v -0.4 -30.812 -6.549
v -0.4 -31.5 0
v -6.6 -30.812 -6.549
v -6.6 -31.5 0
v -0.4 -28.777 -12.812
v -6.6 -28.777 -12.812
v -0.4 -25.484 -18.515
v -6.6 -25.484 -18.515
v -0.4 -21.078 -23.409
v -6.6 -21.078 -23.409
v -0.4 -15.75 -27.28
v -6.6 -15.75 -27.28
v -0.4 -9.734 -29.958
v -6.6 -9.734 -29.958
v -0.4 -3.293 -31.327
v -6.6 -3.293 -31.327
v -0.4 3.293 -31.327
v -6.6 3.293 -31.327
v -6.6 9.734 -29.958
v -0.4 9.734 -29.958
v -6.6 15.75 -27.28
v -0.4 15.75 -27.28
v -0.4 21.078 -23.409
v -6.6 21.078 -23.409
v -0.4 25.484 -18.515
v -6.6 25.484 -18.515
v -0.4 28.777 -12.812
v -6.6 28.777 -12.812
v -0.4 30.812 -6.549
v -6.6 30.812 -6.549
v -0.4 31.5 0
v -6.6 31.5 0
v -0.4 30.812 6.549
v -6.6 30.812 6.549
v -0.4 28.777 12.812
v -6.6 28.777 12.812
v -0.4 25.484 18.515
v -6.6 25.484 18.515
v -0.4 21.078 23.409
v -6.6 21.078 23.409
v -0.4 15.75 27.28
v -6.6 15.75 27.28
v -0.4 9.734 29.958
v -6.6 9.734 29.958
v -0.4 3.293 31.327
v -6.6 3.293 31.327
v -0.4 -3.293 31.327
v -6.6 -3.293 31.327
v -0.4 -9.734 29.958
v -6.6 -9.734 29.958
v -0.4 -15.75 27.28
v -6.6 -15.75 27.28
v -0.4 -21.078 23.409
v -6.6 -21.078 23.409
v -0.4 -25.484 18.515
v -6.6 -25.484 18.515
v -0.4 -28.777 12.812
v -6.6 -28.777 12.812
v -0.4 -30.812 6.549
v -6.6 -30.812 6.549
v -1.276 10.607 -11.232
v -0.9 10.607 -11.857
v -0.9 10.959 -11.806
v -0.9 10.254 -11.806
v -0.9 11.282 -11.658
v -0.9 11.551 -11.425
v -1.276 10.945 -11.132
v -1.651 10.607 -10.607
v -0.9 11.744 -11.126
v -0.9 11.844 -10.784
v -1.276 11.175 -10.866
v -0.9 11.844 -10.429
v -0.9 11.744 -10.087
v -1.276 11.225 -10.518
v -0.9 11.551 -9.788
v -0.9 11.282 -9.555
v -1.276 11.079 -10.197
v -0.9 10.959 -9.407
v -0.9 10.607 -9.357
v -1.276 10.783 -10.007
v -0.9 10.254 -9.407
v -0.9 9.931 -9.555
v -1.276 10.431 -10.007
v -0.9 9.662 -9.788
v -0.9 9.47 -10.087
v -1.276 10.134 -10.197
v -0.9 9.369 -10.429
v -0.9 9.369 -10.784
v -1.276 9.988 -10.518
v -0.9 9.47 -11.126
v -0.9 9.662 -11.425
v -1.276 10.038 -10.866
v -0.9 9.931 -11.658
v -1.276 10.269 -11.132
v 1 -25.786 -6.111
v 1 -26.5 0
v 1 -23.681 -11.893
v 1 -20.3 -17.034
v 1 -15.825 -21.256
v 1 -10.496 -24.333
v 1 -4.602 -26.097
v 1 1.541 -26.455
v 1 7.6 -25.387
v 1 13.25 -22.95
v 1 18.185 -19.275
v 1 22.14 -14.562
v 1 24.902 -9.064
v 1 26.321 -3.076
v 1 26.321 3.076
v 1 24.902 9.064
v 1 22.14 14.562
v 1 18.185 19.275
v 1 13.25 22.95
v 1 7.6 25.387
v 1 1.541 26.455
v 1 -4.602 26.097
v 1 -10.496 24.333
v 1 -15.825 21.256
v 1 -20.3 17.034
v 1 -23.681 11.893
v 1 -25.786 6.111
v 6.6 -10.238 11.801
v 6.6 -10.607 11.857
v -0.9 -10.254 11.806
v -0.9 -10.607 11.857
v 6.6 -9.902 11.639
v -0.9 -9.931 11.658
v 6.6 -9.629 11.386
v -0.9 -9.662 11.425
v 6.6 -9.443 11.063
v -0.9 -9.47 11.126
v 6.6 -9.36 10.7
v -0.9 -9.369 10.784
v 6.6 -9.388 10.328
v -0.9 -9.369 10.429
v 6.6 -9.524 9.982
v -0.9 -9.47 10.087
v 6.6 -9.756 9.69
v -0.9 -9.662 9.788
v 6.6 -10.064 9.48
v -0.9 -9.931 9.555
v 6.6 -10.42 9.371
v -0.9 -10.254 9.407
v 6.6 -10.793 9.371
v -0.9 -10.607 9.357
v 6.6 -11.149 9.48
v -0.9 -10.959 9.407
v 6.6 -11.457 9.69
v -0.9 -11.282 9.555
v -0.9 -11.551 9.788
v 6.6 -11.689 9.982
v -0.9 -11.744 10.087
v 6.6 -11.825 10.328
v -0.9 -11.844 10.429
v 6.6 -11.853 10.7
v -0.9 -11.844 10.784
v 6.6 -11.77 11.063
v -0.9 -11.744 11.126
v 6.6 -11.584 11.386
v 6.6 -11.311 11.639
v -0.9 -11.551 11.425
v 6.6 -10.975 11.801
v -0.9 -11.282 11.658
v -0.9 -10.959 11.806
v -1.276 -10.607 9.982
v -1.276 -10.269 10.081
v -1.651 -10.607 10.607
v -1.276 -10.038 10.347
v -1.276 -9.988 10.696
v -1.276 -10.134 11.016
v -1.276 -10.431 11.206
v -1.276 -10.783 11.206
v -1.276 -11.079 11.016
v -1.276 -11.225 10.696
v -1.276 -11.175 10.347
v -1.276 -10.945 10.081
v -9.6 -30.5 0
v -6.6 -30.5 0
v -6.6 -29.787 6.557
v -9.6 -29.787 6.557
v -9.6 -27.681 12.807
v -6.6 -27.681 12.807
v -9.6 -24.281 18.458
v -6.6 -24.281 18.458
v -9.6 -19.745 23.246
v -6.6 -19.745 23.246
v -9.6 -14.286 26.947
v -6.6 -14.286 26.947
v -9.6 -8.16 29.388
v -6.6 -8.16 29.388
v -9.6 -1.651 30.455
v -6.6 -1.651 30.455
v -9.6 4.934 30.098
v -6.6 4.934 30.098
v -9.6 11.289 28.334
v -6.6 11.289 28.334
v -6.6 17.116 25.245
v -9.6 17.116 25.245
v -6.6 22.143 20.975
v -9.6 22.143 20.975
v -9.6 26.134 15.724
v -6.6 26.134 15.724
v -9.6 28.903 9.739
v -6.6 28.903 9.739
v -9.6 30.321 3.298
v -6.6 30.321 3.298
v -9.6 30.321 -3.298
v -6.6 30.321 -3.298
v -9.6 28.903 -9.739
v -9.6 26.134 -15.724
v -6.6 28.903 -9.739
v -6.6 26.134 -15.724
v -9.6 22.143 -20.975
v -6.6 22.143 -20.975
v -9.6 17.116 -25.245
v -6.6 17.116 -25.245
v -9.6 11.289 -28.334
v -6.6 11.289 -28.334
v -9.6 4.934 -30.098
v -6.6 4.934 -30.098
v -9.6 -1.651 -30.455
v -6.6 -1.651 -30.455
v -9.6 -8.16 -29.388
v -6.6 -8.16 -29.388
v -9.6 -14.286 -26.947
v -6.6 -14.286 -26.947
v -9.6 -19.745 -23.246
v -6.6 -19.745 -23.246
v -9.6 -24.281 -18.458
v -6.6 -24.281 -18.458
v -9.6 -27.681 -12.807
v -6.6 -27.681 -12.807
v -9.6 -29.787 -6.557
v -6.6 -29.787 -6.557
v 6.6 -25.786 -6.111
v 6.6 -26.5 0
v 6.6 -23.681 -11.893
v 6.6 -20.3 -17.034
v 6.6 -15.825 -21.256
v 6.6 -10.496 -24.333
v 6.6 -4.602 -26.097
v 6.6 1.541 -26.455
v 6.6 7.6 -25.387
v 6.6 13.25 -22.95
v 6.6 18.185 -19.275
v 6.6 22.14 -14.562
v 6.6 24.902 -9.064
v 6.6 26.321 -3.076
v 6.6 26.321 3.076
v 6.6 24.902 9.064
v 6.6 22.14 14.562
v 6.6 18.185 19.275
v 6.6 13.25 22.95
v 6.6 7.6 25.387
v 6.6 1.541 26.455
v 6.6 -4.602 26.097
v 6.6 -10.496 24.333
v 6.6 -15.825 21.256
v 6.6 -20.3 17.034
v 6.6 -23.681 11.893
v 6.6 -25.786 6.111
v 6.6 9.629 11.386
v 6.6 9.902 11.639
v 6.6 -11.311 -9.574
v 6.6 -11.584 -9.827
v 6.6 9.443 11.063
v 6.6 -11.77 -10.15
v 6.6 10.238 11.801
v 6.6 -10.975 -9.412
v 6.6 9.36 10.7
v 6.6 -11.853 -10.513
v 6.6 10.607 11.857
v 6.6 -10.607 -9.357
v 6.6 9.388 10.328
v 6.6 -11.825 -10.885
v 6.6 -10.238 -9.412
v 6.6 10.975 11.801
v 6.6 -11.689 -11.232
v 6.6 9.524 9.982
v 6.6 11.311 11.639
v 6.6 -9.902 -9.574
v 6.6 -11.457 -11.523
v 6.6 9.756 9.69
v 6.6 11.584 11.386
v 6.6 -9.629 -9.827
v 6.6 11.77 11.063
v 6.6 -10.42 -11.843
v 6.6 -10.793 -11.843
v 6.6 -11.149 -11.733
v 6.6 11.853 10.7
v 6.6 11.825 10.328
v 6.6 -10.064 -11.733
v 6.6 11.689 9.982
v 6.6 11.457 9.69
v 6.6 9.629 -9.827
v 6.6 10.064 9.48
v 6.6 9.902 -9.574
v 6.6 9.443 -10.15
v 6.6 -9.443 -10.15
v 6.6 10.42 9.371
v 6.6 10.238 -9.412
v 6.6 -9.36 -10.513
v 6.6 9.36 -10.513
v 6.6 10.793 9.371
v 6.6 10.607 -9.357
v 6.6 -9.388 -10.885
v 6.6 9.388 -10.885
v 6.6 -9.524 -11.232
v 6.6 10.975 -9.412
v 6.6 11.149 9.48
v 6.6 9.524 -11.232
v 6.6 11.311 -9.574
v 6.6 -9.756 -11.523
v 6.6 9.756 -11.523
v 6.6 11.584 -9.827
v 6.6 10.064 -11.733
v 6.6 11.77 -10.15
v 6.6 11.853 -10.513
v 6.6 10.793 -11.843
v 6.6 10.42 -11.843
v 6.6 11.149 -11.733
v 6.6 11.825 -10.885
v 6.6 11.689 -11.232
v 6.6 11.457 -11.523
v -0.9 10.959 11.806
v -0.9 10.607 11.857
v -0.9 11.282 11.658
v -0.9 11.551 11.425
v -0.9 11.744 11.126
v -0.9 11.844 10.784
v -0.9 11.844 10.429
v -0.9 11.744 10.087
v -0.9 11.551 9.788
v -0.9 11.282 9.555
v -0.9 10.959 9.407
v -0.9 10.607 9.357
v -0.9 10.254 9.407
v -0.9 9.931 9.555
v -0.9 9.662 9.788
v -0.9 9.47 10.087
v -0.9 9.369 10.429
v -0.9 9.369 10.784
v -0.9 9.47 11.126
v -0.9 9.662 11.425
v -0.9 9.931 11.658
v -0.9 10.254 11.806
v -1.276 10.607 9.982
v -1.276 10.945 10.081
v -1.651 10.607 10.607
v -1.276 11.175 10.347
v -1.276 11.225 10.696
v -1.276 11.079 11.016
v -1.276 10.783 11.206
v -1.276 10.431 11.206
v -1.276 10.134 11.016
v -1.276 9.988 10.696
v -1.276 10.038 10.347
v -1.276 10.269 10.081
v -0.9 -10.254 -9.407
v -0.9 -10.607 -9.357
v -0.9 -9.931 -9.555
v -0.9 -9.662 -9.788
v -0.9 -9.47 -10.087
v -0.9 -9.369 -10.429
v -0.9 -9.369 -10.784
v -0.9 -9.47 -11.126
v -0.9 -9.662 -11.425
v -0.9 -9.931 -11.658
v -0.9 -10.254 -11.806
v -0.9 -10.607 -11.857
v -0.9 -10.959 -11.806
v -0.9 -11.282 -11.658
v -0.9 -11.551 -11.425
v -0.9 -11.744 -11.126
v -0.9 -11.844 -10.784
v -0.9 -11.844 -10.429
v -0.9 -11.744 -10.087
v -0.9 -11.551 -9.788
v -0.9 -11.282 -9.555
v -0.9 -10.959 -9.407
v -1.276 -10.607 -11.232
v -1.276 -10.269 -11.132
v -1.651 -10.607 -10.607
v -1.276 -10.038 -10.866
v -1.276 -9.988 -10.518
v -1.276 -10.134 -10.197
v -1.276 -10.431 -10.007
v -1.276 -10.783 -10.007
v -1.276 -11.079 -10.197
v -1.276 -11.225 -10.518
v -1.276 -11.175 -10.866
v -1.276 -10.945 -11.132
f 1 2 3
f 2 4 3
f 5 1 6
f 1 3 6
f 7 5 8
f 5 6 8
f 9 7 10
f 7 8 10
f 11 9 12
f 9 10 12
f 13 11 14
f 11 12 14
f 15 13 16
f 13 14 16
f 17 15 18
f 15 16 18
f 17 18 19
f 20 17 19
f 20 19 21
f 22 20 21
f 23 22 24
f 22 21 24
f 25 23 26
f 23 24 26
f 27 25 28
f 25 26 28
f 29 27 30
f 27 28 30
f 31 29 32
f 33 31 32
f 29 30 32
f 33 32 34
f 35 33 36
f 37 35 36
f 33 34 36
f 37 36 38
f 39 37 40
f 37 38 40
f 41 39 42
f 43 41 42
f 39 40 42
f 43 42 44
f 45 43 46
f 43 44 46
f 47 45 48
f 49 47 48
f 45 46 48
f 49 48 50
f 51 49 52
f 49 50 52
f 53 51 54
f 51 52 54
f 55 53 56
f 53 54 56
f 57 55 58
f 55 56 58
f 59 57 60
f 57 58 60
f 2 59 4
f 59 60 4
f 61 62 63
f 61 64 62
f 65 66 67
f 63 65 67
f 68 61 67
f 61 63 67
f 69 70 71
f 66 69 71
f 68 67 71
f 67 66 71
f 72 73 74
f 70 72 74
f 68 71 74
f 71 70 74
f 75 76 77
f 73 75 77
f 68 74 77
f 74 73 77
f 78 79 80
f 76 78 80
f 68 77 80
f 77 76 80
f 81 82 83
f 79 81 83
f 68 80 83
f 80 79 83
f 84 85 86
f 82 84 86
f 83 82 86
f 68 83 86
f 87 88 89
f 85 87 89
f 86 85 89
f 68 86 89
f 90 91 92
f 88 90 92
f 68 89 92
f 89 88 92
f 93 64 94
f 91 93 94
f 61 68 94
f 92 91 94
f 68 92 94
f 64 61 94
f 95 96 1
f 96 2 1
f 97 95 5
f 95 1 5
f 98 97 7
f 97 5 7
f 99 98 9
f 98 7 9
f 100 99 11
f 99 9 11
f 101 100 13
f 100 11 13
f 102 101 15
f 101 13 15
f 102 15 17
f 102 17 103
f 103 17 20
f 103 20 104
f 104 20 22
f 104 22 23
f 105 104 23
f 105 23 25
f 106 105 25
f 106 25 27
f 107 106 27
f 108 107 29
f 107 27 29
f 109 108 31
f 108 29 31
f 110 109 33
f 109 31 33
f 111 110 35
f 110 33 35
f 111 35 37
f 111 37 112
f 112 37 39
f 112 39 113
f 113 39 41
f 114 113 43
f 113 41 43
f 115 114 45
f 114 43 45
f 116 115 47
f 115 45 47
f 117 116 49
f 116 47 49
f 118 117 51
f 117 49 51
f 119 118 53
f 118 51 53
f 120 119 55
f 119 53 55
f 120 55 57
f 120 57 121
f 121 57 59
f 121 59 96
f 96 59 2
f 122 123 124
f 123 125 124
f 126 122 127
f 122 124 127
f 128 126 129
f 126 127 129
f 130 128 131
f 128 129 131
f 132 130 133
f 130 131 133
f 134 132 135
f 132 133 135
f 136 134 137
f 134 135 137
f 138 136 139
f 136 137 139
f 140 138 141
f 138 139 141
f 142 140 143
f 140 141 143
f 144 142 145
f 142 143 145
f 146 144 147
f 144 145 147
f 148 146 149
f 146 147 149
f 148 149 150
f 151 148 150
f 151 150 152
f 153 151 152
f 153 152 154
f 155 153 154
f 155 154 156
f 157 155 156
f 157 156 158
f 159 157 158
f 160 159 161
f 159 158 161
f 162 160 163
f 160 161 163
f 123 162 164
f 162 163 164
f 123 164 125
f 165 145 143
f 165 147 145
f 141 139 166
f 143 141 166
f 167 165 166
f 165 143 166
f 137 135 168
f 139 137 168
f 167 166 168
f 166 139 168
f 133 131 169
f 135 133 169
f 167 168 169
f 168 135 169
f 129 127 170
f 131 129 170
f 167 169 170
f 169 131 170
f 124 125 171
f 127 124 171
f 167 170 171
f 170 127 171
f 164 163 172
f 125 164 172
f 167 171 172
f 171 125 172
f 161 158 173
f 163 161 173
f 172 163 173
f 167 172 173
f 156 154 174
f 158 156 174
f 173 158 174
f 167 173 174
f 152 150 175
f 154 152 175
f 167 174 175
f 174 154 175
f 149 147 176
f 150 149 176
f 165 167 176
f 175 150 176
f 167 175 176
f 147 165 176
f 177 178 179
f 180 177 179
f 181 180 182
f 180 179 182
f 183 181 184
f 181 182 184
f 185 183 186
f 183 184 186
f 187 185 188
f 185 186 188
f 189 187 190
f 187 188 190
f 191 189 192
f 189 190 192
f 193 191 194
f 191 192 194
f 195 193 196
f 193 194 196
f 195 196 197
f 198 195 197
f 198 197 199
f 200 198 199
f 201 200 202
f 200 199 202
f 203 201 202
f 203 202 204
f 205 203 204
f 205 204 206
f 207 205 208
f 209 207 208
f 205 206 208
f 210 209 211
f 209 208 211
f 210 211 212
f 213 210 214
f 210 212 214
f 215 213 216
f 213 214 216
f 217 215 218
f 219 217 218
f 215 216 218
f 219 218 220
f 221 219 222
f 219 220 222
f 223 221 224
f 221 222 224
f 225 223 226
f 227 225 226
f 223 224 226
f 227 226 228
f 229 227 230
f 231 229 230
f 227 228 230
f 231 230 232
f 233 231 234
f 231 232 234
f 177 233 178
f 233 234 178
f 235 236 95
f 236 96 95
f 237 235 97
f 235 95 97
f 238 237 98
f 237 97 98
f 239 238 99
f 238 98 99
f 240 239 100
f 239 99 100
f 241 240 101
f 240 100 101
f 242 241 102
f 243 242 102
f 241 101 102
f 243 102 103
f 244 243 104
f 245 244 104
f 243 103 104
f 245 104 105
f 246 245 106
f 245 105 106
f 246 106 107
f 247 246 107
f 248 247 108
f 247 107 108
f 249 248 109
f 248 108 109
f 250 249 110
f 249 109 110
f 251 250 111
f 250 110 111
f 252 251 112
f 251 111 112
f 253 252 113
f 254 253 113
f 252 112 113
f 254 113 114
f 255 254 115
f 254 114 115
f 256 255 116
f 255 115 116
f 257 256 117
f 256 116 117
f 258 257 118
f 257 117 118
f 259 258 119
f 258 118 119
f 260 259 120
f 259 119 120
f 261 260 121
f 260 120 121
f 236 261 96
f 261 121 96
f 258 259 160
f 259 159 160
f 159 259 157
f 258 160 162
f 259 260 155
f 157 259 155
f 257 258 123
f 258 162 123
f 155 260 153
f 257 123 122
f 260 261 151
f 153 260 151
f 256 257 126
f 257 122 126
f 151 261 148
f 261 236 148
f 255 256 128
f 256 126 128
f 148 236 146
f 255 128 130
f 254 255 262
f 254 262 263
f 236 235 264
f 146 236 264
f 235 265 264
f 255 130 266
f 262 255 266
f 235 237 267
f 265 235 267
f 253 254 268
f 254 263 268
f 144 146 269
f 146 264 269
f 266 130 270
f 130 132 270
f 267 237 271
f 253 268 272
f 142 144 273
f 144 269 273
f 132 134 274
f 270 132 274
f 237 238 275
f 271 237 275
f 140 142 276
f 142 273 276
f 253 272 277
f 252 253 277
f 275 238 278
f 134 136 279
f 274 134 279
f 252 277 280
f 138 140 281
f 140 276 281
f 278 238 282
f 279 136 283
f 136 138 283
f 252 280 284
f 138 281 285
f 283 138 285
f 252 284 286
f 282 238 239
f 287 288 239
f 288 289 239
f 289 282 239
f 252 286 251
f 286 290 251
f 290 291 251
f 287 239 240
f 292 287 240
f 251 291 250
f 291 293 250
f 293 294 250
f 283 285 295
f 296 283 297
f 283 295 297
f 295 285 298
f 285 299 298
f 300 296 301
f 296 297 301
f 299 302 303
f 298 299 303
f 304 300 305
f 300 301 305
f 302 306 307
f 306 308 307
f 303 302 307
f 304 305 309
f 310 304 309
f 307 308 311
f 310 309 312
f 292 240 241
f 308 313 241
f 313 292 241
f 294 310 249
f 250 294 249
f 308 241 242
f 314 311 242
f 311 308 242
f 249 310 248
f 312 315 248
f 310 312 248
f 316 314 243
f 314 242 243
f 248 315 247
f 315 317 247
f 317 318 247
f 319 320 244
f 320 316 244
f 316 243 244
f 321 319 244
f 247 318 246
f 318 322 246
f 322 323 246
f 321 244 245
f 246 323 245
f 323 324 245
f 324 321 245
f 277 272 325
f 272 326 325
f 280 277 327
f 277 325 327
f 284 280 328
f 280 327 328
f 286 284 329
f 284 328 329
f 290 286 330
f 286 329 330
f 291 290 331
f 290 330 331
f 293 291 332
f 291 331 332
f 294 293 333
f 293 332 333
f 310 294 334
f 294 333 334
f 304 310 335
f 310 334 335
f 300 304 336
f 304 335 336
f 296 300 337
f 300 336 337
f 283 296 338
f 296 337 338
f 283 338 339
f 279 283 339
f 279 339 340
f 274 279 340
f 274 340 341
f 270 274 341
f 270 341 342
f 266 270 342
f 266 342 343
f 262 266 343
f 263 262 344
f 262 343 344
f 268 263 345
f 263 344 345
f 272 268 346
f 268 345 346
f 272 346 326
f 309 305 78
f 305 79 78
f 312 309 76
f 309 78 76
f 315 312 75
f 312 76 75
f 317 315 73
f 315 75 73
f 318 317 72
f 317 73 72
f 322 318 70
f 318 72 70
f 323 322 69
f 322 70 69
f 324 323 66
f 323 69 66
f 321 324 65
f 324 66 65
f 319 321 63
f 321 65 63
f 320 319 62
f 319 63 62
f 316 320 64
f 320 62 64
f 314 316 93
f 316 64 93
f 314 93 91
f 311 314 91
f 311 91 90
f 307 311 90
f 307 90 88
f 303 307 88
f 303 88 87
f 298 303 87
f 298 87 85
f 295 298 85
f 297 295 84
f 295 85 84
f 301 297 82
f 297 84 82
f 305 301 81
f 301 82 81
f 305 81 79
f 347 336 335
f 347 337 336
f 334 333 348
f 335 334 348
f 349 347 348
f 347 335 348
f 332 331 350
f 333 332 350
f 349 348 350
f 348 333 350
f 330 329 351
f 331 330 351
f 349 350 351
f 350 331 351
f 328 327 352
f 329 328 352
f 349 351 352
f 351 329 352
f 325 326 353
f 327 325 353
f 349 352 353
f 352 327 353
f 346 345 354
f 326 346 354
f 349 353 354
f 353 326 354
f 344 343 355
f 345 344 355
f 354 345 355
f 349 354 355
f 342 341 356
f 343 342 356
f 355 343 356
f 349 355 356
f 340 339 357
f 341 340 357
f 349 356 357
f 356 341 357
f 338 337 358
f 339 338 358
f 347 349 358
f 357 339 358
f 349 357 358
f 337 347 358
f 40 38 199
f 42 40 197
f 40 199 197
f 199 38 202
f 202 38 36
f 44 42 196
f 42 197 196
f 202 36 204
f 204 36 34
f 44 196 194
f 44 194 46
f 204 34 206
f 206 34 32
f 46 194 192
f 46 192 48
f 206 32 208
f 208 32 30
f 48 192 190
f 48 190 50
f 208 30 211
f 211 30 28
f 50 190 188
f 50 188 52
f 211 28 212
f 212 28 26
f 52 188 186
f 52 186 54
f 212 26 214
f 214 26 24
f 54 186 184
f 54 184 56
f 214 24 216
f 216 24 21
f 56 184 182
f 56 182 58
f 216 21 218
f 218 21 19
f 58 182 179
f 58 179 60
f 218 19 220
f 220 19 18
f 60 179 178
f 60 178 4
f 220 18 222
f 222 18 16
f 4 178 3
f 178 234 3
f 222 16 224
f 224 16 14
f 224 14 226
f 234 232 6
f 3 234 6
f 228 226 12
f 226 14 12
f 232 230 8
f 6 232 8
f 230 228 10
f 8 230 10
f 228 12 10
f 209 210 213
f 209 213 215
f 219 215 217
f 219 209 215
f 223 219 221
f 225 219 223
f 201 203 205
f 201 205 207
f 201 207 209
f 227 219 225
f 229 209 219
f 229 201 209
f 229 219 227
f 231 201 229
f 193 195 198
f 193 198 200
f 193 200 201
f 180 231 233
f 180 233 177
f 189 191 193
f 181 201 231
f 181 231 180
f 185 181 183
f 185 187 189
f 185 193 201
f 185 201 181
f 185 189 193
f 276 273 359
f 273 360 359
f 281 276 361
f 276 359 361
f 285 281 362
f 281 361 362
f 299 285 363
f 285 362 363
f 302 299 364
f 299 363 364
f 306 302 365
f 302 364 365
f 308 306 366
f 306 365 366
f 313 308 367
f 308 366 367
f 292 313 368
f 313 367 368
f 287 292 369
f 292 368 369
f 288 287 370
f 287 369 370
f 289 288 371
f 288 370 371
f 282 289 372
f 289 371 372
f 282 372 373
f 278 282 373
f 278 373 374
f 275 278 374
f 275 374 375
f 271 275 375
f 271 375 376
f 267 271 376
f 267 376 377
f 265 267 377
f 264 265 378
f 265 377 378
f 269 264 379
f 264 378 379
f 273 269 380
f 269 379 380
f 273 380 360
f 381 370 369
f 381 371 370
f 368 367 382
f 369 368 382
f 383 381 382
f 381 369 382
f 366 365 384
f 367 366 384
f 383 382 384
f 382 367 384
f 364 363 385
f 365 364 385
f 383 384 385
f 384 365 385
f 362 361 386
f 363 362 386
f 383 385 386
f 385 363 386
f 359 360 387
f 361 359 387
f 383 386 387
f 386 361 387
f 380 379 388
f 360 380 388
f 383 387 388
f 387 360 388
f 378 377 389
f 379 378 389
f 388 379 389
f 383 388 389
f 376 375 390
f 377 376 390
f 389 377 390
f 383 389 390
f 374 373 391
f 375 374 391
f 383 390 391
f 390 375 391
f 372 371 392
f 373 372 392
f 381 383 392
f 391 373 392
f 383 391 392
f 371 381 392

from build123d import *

# Parameters (mm, degrees)
M3X0_5_TAPPED_HOLE1_D     = 2.5
M3X0_5_TAPPED_HOLE1_DEPTH = 7.5
M3X0_5_TAPPED_HOLE1_TIP   = 0.751075774
SKETCH5_R                 = 30.5
BOSS_EXTRUDE1_DEPTH       = 3


with BuildPart() as part:
    # Sketch1 → Revolve1 (revolve)
    with BuildSketch(Plane.XY, mode=Mode.PRIVATE) as revolve1_sk:
        Polygon((-6.6, 0), (6.6, 0), (6.6, 26.5), (1, 26.5), (-0.4, 31.5), (-6.6, 31.5), align=None)
    revolve(revolve1_sk.sketch.rotate(Axis((-6.6, 0, 0), (1, 0, 0)), 180), axis=Axis((-6.6, 0, 0), (1, 0, 0)))

    # M3x0.5 Tapped Hole1
    with Locations(Plane(origin=(6.6, 0, 0), x_dir=(0, 0, -1), z_dir=(1, 0, 0))):
        with Locations((-10.606601718, 10.606601718), (-10.606601718, -10.606601718), (10.606601718, -10.606601718), (10.606601718, 10.606601718)):
            Hole(M3X0_5_TAPPED_HOLE1_D / 2, depth=M3X0_5_TAPPED_HOLE1_DEPTH)
            with Locations((0, 0, -(M3X0_5_TAPPED_HOLE1_DEPTH + M3X0_5_TAPPED_HOLE1_TIP / 2))):  # 118° drill point
                Cone(0, M3X0_5_TAPPED_HOLE1_D / 2, M3X0_5_TAPPED_HOLE1_TIP, mode=Mode.SUBTRACT)

    # Sketch5 → Boss-Extrude1 (add)
    with BuildSketch(Plane.ZY.offset(6.6)):
        with Locations(Location((0, 0, 0), (0, 0, 270))):
            Circle(SKETCH5_R)
    extrude(amount=BOSS_EXTRUDE1_DEPTH)


solid = part.part
